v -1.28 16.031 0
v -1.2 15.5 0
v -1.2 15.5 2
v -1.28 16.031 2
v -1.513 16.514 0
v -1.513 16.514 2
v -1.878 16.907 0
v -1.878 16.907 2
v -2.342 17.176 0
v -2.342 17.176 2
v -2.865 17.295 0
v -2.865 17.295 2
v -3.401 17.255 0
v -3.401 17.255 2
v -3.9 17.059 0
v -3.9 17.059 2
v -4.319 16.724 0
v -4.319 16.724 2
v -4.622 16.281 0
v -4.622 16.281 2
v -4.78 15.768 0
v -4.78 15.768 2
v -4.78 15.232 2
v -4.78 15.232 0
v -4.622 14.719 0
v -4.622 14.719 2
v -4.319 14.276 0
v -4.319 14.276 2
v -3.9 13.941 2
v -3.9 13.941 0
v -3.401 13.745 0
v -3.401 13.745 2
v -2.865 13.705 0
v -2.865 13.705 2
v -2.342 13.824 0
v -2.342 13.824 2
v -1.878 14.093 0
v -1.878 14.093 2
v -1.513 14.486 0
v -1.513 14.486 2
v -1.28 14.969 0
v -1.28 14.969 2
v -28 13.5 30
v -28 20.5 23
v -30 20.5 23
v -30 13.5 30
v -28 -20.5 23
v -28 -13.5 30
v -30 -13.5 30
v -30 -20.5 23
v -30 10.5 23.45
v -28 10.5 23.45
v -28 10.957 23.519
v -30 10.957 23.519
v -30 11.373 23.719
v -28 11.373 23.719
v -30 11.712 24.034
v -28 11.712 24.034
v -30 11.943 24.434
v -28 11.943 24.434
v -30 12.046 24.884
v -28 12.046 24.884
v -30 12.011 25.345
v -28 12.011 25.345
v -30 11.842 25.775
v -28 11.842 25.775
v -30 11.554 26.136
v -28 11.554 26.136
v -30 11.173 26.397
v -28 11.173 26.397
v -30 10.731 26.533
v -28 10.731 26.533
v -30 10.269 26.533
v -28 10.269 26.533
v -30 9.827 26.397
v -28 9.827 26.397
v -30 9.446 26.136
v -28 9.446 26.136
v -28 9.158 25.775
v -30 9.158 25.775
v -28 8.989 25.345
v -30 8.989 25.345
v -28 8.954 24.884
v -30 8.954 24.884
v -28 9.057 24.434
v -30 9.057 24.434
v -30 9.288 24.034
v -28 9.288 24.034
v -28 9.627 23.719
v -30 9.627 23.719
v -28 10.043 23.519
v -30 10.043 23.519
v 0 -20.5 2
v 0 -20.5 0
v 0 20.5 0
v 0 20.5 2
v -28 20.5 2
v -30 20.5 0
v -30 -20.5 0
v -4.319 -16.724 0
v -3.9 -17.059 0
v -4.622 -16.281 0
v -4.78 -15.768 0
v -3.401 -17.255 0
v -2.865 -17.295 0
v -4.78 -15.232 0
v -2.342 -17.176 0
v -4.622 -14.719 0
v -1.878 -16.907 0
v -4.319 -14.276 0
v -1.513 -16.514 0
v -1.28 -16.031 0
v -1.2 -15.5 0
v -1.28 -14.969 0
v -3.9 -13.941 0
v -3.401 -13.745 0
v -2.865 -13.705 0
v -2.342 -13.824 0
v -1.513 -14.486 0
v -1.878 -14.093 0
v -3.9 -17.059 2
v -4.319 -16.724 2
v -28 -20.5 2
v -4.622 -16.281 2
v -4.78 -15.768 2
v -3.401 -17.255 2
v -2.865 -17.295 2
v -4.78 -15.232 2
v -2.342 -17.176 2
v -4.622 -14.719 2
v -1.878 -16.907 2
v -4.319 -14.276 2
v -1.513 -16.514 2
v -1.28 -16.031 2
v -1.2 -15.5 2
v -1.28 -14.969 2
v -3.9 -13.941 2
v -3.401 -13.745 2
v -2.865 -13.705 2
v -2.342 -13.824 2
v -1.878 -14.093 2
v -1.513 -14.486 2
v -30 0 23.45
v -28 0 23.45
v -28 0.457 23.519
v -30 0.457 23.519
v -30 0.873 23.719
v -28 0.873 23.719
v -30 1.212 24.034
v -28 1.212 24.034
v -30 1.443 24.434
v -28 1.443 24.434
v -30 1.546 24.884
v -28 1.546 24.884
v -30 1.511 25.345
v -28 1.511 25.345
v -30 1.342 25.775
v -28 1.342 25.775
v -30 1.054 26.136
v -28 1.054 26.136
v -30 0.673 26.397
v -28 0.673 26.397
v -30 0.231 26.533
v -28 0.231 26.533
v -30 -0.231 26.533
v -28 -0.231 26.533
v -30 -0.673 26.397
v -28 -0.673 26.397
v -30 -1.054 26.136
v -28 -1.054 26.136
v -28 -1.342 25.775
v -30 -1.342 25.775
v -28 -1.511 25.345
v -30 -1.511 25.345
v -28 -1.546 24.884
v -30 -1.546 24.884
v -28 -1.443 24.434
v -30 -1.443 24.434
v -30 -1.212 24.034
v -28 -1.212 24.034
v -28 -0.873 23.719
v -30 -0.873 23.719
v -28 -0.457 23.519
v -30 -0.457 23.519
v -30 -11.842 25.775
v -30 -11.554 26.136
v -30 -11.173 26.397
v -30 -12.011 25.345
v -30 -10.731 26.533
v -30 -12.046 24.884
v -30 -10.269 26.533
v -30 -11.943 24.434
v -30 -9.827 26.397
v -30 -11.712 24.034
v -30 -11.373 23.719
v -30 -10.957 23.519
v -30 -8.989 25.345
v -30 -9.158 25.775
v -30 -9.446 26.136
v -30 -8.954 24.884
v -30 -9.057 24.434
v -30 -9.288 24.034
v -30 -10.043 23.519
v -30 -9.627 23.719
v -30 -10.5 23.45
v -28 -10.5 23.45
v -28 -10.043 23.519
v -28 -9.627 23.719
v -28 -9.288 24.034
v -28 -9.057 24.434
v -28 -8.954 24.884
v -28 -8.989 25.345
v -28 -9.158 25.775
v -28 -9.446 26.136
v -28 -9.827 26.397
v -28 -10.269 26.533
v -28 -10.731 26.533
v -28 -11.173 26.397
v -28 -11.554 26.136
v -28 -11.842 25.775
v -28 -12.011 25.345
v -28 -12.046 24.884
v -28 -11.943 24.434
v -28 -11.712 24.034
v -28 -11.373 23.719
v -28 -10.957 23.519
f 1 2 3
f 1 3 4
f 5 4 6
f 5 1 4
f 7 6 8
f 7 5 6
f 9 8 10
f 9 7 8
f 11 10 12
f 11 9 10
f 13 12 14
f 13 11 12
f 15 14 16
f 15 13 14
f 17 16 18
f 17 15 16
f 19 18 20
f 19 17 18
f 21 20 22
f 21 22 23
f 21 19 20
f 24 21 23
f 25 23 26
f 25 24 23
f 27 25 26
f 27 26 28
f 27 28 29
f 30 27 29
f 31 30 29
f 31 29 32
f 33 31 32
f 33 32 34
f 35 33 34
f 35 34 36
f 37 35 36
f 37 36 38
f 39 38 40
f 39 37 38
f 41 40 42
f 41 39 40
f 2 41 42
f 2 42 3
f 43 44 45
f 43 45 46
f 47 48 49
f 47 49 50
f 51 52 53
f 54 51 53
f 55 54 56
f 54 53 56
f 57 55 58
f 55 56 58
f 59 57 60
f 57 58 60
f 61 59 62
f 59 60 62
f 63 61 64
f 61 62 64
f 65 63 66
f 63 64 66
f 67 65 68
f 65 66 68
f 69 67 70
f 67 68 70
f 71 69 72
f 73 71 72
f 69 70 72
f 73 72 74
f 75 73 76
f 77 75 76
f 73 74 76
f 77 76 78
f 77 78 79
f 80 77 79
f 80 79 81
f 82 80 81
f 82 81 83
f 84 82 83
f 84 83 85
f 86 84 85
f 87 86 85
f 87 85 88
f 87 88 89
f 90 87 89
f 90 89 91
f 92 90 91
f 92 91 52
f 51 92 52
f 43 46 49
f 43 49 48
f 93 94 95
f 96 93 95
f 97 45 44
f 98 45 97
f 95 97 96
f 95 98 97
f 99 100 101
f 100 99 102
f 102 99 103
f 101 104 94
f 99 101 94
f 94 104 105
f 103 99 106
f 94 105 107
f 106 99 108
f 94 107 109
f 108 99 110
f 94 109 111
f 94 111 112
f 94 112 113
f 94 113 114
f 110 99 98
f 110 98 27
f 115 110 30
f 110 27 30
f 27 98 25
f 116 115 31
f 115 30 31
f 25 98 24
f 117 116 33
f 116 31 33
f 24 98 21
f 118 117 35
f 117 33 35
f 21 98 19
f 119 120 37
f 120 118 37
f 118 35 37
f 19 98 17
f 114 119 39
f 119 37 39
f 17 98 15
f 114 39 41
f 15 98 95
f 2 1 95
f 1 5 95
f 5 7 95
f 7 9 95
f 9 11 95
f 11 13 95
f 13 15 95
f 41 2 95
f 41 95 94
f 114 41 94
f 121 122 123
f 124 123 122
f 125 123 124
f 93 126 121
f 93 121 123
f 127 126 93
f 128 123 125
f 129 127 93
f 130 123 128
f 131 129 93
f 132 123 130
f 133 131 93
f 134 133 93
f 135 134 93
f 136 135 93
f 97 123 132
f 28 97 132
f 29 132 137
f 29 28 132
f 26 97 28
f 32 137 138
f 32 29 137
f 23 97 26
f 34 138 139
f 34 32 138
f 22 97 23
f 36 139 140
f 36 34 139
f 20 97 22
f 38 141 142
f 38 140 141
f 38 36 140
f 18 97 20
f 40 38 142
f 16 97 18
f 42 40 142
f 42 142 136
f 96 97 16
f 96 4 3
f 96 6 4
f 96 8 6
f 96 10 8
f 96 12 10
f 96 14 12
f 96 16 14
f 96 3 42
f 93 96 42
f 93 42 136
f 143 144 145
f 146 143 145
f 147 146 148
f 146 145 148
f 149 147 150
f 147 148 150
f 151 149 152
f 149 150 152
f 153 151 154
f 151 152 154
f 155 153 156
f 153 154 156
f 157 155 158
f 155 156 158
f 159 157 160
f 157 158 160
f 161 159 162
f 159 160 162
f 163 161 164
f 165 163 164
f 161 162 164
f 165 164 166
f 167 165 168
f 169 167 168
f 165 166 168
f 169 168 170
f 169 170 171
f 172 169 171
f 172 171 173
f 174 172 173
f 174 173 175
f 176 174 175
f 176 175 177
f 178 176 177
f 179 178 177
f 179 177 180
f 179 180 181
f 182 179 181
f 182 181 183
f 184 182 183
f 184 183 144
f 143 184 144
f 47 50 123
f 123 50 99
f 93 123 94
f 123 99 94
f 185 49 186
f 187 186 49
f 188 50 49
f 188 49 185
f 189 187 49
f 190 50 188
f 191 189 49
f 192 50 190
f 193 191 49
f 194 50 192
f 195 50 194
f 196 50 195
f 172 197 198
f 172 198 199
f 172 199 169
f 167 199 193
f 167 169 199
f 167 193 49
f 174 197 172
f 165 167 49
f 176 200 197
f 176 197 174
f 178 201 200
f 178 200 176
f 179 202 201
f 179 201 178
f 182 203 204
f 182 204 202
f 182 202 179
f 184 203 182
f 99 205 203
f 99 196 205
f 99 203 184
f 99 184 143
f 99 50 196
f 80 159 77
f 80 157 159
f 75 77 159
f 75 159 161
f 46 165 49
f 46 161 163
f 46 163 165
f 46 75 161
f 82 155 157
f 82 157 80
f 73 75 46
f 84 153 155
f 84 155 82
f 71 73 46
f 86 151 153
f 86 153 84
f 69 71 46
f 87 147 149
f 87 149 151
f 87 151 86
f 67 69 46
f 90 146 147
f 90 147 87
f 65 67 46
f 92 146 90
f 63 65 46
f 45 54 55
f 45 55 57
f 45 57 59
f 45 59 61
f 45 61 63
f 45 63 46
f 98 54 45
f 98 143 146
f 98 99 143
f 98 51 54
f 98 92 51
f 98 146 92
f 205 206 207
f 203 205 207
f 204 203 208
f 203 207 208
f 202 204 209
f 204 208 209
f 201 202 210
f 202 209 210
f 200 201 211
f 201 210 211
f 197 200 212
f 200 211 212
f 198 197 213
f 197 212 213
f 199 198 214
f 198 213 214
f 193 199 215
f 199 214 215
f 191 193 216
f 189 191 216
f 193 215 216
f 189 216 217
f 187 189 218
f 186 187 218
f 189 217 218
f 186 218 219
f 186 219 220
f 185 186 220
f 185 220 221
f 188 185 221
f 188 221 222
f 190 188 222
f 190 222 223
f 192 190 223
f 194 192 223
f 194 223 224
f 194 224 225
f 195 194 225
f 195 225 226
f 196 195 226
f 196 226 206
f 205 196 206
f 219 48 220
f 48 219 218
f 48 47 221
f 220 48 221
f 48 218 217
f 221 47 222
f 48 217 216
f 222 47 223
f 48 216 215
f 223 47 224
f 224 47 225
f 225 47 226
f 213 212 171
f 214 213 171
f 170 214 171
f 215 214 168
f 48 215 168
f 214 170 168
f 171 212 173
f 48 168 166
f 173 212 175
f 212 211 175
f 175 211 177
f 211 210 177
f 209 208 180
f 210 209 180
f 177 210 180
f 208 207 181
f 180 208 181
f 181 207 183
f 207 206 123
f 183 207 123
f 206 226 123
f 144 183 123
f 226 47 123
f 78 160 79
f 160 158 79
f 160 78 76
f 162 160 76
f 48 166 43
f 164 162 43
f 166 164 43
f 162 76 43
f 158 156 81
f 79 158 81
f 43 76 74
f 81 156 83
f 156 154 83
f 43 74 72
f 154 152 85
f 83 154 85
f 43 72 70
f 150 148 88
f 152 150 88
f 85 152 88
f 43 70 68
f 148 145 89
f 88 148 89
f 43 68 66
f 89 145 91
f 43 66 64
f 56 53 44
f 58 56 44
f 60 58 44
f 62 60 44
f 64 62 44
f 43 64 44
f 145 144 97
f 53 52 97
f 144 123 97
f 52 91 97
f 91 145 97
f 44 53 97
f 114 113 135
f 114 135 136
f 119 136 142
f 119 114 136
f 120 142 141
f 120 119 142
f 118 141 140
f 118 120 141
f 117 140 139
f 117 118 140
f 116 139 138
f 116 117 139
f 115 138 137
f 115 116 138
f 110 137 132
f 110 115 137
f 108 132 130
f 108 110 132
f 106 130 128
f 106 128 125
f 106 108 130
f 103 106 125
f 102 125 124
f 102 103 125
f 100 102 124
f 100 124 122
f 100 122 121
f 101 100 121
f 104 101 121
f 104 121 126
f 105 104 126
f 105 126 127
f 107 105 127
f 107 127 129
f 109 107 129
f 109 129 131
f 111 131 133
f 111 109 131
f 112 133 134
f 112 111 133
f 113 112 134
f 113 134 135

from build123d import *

# Parameters (mm, degrees)
SKETCH1_W           = 30
SKETCH1_H           = 41
SKETCH1_R           = 1.8
BOSS_EXTRUDE1_DEPTH = 2
SKETCH2_W           = 2
SKETCH2_H           = 41
BOSS_EXTRUDE2_DEPTH = 28
SKETCH3_R           = 1.55
CUT_EXTRUDE1_DEPTH  = 10


with BuildPart() as part:
    # Sketch1 → Boss-Extrude1 (new body)
    with BuildSketch(Plane.XY):
        with Locations((-15, 0)):
            Rectangle(SKETCH1_W, SKETCH1_H)
        with Locations((-3, 15.5)):
            Circle(SKETCH1_R, mode=Mode.SUBTRACT)
        with Locations((-3, -15.5)):
            Circle(SKETCH1_R, mode=Mode.SUBTRACT)
    extrude(amount=BOSS_EXTRUDE1_DEPTH)

    # Sketch2 → Boss-Extrude2 (add)
    with BuildSketch(Plane.XY.offset(2)):
        with Locations((-29, 0)):
            Rectangle(SKETCH2_W, SKETCH2_H)
    extrude(amount=BOSS_EXTRUDE2_DEPTH)

    # Sketch3 → Cut-Extrude1 (cut)
    with BuildSketch(Plane(origin=(-28, 0, 0), x_dir=(0, 0, -1), z_dir=(1, 0, 0))):
        with Locations((-25, 10.5)):
            Circle(SKETCH3_R)
        with Locations((-25, -10.5)):
            Circle(SKETCH3_R)
        with Locations((-25, 0)):
            Circle(SKETCH3_R)
        Polygon((-30, -13.5), (-23, -20.5), (-30, -20.5), align=None)
        Polygon((-30, 13.5), (-30, 20.5), (-23, 20.5), align=None)
    extrude(amount=-CUT_EXTRUDE1_DEPTH, mode=Mode.SUBTRACT)


solid = part.part
